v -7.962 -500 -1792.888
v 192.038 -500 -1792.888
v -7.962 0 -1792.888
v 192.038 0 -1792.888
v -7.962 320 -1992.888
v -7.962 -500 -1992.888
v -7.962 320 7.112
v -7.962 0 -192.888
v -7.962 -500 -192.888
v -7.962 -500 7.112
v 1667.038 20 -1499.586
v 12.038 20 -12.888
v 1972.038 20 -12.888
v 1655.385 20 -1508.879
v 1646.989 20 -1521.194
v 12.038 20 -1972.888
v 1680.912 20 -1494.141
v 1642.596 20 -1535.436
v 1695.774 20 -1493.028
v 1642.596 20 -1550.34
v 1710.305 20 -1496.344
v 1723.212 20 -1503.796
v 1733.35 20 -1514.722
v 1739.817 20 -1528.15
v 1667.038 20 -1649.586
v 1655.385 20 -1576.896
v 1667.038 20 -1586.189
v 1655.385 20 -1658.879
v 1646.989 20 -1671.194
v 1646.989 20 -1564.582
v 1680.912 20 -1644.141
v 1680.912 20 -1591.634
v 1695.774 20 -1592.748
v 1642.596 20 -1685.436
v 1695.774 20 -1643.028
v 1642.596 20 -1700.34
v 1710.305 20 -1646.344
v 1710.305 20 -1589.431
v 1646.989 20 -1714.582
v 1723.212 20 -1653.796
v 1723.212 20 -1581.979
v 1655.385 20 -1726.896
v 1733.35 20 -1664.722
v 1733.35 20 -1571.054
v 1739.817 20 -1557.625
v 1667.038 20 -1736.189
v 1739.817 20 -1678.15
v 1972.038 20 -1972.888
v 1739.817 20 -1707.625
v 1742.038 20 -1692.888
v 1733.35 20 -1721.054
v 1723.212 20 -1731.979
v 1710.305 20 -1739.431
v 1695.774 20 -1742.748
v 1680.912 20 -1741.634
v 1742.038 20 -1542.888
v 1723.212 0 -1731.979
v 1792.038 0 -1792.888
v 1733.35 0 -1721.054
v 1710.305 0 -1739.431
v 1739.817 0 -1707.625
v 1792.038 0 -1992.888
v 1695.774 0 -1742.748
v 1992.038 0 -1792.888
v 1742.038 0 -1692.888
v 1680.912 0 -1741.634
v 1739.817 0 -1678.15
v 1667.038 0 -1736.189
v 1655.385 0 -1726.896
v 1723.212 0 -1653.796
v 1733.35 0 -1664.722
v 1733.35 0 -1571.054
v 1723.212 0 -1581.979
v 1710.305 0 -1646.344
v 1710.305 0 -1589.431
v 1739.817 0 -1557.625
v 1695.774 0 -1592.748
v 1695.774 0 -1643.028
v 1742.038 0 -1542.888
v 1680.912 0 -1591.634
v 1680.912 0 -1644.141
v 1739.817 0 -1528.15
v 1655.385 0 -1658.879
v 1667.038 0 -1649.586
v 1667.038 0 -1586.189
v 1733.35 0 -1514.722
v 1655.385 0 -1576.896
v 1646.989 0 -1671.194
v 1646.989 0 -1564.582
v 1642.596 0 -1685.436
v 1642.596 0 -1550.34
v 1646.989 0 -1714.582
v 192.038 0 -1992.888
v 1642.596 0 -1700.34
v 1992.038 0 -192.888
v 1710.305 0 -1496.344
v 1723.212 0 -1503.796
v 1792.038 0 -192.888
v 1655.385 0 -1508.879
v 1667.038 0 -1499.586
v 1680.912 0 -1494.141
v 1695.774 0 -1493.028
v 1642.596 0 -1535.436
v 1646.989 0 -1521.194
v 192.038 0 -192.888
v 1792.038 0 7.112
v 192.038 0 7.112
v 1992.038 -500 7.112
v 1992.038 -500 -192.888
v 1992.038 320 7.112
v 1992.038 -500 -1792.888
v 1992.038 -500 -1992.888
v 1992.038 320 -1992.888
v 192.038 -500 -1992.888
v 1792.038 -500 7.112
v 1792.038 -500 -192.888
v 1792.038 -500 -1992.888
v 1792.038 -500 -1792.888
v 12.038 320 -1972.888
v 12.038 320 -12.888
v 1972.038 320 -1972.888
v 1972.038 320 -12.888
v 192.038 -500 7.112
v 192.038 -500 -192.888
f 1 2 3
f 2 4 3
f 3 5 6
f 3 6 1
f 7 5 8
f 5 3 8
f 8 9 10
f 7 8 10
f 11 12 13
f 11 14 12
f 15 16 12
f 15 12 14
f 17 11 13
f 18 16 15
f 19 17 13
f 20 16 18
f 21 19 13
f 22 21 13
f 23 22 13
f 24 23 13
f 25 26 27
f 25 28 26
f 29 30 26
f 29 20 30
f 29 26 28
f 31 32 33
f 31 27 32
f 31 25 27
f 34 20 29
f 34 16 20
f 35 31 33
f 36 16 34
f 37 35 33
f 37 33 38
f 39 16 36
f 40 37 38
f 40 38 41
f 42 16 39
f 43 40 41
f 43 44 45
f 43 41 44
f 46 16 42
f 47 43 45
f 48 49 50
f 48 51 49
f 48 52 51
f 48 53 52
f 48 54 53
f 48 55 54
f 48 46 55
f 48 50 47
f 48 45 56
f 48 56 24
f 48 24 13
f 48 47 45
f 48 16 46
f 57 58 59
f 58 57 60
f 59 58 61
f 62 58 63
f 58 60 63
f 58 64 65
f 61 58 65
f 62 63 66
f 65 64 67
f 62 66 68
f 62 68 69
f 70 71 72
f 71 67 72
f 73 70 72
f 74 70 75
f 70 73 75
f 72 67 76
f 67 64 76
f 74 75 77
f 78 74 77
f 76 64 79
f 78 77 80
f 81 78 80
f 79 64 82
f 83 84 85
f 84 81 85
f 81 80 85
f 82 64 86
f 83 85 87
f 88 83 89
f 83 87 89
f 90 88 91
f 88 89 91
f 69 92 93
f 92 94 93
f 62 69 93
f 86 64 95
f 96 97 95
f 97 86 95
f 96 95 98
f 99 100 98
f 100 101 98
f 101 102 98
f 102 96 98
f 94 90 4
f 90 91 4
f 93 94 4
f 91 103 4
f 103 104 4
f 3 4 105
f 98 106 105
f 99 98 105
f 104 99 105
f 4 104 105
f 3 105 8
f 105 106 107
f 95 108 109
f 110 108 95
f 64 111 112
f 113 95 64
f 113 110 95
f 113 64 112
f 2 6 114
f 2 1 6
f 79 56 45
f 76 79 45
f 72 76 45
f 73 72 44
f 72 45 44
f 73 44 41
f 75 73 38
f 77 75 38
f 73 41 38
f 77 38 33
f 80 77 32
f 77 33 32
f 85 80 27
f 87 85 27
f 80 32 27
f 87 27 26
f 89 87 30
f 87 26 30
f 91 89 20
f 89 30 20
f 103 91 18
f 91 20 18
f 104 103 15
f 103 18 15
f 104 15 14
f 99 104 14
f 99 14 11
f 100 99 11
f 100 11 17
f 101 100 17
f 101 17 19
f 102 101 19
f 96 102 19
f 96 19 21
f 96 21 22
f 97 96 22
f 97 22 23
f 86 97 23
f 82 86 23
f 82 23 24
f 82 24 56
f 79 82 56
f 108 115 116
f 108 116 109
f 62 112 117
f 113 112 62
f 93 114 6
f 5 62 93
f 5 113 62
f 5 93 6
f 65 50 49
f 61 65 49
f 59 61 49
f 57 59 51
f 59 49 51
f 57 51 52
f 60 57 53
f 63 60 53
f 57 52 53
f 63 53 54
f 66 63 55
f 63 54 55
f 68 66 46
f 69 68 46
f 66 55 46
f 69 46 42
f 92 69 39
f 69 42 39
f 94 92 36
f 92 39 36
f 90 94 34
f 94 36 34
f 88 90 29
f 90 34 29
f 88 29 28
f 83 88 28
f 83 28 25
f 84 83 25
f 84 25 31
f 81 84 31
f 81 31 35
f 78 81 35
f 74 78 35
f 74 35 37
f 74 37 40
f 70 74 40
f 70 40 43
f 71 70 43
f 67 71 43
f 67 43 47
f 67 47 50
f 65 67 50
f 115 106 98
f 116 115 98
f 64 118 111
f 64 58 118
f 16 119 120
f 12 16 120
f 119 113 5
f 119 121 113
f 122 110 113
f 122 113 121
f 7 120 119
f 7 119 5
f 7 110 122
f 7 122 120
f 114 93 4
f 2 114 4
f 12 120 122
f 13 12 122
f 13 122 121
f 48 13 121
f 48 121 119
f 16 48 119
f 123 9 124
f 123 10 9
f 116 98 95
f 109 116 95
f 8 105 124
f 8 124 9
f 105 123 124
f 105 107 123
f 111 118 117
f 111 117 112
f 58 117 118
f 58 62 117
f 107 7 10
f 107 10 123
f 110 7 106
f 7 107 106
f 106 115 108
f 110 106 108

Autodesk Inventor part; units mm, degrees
ref_plane "YZ Plane" through (0, 0, 0) normal (1, 0, 0) x (0, 1, 0)
ref_plane "XZ Plane" through (0, 0, 0) normal (0, 1, 0) x (-1, 0, 0)
ref_plane "XY Plane" through (0, 0, 0) normal (0, 0, 1) x (1, 0, 0)
sketch "Sketch2" plane through (0, 0, 0) normal (0, 1, 0) x (-1, 0, 0)
  line L0 (7.9621, 7.1123) -> (-1992.0379, 7.1123)
  line L1 (-1992.0379, 7.1123) -> (-1992.0379, -1992.8877)
  line L2 (-1992.0379, -1992.8877) -> (7.9621, -1992.8877)
  line L3 (7.9621, -1992.8877) -> (7.9621, 7.1123)
  point P0 (0, 0)
  dimension "d0" = 2000
  dimension "d1" = 2000
extrude "Extrusion1" add sketch "Sketch2" along normal blind 320
sketch "Sketch5" plane through (0, 320, 0) normal (0, 1, 0) x (1, 0, 0)
  line L0 (12.0379, 12.8877) -> (1972.0379, 12.8877)
  line L1 (1972.0379, 12.8877) -> (1972.0379, 1972.8877)
  line L2 (1972.0379, 1972.8877) -> (12.0379, 1972.8877)
  line L3 (12.0379, 1972.8877) -> (12.0379, 12.8877)
  line L4 (-7.9621, -7.1123) -> (1992.0379, -7.1123) projected
  line L5 (1992.0379, -7.1123) -> (1992.0379, 1992.8877) projected
  dimension "d7" = 1960
  dimension "d8" = 20
  dimension "d9" = 1960
  dimension "d10" = 20
extrude "Extrusion2" cut sketch "Sketch5" against normal blind 300
sketch "Sketch6" plane through (0, 20, 0) normal (0, 1, 0) x (1, 0, 0)
  circle A0 centre (1692.0379, 1692.8877) radius 50
  circle A1 centre (1692.0379, 1542.8877) radius 50
  line L0 (1992.0379, 1992.8877) -> (-7.9621, 1992.8877) projected
  line L1 (1992.0379, -7.1123) -> (1992.0379, 1992.8877) projected
  point P0 (0, 0)
  dimension "d13" = 100
  dimension "d14" = 100
  dimension "d15" = 300
  dimension "d16" = 300
  dimension "d17" = 300
  dimension "d18" = 150
extrude "Extrusion3" cut sketch "Sketch6" against normal blind 300
sketch "Sketch7" plane through (0, 0, 0) normal (0, -1, 0) x (1, 0, 0)
  line L0 (1992.0379, 7.1123) -> (1792.0379, 7.1123)
  line L1 (1792.0379, 7.1123) -> (1792.0379, -192.8877)
  line L2 (1792.0379, -192.8877) -> (1992.0379, -192.8877)
  line L3 (1992.0379, -192.8877) -> (1992.0379, 7.1123)
  line L4 (-7.9621, 7.1123) -> (1992.0379, 7.1123) projected
  line L5 (-7.9621, 7.1123) -> (192.0379, 7.1123)
  line L6 (192.0379, 7.1123) -> (192.0379, -192.8877)
  line L7 (192.0379, -192.8877) -> (-7.9621, -192.8877)
  line L8 (-7.9621, -192.8877) -> (-7.9621, 7.1123)
  line L9 (1792.0379, -1992.8877) -> (1792.0379, -1792.8877)
  line L10 (1792.0379, -1792.8877) -> (1992.0379, -1792.8877)
  line L11 (1992.0379, -1792.8877) -> (1992.0379, -1992.8877)
  line L12 (-7.9621, -1992.8877) -> (192.0379, -1992.8877)
  line L13 (192.0379, -1992.8877) -> (192.0379, -1792.8877)
  line L14 (192.0379, -1792.8877) -> (-7.9621, -1792.8877)
  line L15 (-7.9621, -1792.8877) -> (-7.9621, -1992.8877)
  point P0 (0, 0)
  point P1 (0, -1985.7753)
  dimension "d23" = 200
  dimension "d24" = 200
extrude "Extrusion4" add sketch "Sketch7" along normal blind 500
sketch "Sketch8" plane through (0, 0, 0) normal (0, -1, 0) x (1, 0, 0)
  line L0 (1992.0379, -1992.8877) -> (-7.9621, -1992.8877) projected
  line L1 (1992.0379, -1992.8877) -> (1792.0379, -1992.8877)
  line L2 (1792.0379, -1992.8877) -> (1792.0379, -1792.8877)
  line L3 (1792.0379, -1792.8877) -> (1992.0379, -1792.8877)
  line L4 (1992.0379, -1792.8877) -> (1992.0379, -1992.8877)
  point P0 (0, 0)
  dimension "d27" = 200
  dimension "d28" = 200
extrude "Extrusion5" add sketch "Sketch8" along normal blind 500
properties part number "grow bed"
